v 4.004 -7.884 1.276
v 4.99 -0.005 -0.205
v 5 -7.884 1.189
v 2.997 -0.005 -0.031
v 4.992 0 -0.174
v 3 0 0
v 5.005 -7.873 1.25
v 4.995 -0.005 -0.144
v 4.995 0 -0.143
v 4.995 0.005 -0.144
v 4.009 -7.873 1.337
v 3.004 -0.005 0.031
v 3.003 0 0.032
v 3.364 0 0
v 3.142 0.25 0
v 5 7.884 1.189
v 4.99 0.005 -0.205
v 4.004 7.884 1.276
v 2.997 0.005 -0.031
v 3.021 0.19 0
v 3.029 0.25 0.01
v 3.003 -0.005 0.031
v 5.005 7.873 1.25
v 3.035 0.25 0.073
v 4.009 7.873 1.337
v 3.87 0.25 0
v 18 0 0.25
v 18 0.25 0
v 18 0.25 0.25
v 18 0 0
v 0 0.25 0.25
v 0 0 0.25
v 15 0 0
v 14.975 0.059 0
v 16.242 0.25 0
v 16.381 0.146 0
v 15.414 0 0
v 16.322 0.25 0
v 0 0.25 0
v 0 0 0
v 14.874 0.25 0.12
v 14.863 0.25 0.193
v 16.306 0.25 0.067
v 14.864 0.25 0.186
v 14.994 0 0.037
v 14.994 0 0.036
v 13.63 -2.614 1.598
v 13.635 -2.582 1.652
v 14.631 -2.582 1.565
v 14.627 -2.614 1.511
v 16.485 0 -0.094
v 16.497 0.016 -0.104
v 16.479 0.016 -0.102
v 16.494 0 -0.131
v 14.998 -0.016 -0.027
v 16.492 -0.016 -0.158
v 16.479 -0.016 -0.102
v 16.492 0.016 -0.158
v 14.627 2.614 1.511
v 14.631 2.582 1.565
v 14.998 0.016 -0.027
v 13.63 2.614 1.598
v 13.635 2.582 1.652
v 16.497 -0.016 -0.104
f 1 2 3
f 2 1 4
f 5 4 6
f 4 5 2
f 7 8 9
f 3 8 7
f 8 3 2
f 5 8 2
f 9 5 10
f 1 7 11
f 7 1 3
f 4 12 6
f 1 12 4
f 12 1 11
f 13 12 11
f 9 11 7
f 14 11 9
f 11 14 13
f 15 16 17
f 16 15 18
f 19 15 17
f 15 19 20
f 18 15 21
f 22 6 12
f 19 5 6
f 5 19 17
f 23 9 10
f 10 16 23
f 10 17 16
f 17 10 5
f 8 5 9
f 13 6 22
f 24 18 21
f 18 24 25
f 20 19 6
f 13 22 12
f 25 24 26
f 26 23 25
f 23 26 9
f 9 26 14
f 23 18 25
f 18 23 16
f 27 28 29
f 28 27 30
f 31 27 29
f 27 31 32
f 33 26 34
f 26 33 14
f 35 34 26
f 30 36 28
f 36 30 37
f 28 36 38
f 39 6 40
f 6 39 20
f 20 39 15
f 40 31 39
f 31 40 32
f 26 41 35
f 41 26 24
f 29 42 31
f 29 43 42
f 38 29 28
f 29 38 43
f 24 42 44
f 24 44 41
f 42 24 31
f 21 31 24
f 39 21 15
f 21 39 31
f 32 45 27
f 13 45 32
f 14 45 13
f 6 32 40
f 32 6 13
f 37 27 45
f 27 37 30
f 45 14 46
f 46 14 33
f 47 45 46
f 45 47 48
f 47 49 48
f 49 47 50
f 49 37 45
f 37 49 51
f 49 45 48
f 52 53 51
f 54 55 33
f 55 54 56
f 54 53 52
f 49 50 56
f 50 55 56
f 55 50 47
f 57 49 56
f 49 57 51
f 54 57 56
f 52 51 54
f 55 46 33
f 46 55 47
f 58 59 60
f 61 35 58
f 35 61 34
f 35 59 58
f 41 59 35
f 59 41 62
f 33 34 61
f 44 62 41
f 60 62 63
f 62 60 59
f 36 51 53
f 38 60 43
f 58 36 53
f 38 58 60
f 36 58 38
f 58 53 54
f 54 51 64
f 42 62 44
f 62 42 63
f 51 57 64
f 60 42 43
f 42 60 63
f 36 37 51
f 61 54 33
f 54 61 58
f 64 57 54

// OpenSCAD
$fn = 480;

union() {
	union() {
		cube(size = [18, 0.2500000000, 0.2500000000]);
		translate(v = [3, 0, 0]) {
			rotate(a = [5, 0, 90]) {
				rotate(a = [0, 10, 0]) {
					linear_extrude(center = true, convexity = 0, height = 0.0625000000, twist = 0) {
						polygon(paths = [[0, 1, 2, 3]], points = [[0, 0], [-8, -0.8885280531], [-8, -1.8885280531], [0, -2]]);
					}
				}
				rotate(a = [0, -10, 0]) {
					linear_extrude(center = true, convexity = 0, height = 0.0625000000, twist = 0) {
						polygon(paths = [[0, 1, 2, 3]], points = [[0, 0], [8, -0.8885280531], [8, -1.8885280531], [0, -2]]);
					}
				}
			}
		}
	}
	translate(v = [15, 0, 0]) {
		rotate(a = [5, 0, 90]) {
			rotate(a = [0, 30, 0]) {
				linear_extrude(center = true, convexity = 0, height = 0.0625000000, twist = 0) {
					polygon(paths = [[0, 1, 2, 3]], points = [[0, 0], [-3, 1.5036083501], [-3, 0.5036083501], [0, -1.5000000000]]);
				}
			}
			rotate(a = [0, -30, 0]) {
				linear_extrude(center = true, convexity = 0, height = 0.0625000000, twist = 0) {
					polygon(paths = [[0, 1, 2, 3]], points = [[0, 0], [3, 1.5036083501], [3, 0.5036083501], [0, -1.5000000000]]);
				}
			}
		}
	}
}
/***********************************************
*********      SolidPython code:      **********
************************************************
 
#! /usr/bin/env python
# -*- coding: UTF-8 -*-
from __future__ import division
import os
import sys
import re
from solid import *
import solid.utils
import math

SEGMENTS = 480

def glider(canardWingSpan,canardWingTipChord,canardWingRootChord,canardWingSweepAngle,canardWingDihedralAngle,canardWingXPos,canardWingAngleOfAttack,
           mainWingSpan,mainWingTipChord,mainWingRootChord,mainWingSweepAngle,mainWingDihedralAngle,mainWingXPos,mainWingAngleOfAttack,
           fuselageLength,fuselageWidth):

    def generateWing(Span,TipChord,RootChord,SweepAngle,DihedralAngle,flip):
        #forwardLeft = [0,0,0] #starts from the origin #forwardRight = [0+Span,0-Span/tan(SweepAngle),0]
        #backwardLeft = [0,0-RootChord,0] #backwardRight = [0+Span,0-Span/tan(SweepAngle)-TipChord,0]
        #linear_extrude(height = 1/16, center = true, convexity = 10, twist = 0)
        if flip == True:
            points=[[0,0],[0+Span,0-Span/math.tan(90-SweepAngle)],[0+Span,0-Span/math.tan(90-SweepAngle)-TipChord],[0,0-RootChord]]
        else:
            points=[[0,0],[0-Span,0-Span/math.tan(90-SweepAngle)],[0-Span,0-Span/math.tan(90-SweepAngle)-TipChord],[0,0-RootChord]]

        return polygon(points)

    #drawing the fuselage
    final = cube([fuselageLength,fuselageWidth,fuselageWidth])

    mainWings = translate([mainWingXPos,0,0])(
                     rotate([mainWingAngleOfAttack,0,90])
                        (
                        rotate([0,mainWingDihedralAngle,0])
                            (linear_extrude(1/16,True,0,0)
                                (generateWing(mainWingSpan,mainWingTipChord,mainWingRootChord,mainWingSweepAngle,mainWingDihedralAngle,False))),
                        rotate([0,-mainWingDihedralAngle,0])
                            (linear_extrude(1/16,True,0,0)
                                (generateWing(mainWingSpan,mainWingTipChord,mainWingRootChord,mainWingSweepAngle,mainWingDihedralAngle,True)))
                        ))

    canardWings = translate([canardWingXPos,0,0])(
                         rotate([canardWingAngleOfAttack,0,90])
                            (
                            rotate([0,canardWingDihedralAngle,0])(linear_extrude(1/16,True,0,0)(generateWing(canardWingSpan,canardWingTipChord,canardWingRootChord,canardWingSweepAngle,canardWingDihedralAngle,False))),
                            rotate([0,-canardWingDihedralAngle,0])(linear_extrude(1/16,True,0,0)(generateWing(canardWingSpan,canardWingTipChord,canardWingRootChord,canardWingSweepAngle,canardWingDihedralAngle,True)))
                            ))

    #final = final + mainWings
    final = final + mainWings + canardWings
    return final

if __name__ == '__main__':
    out_dir = sys.argv[1] if len(sys.argv) > 1 else os.curdir
    file_out = os.path.join(out_dir, 'basic_geometry.scad')

    # for canard of aircraft
    canardWingSpan = 3
    canardWingTipChord = 1
    canardWingRootChord = 1.5
    canardWingSweepAngle = 0
    canardWingDihedralAngle = 30
    canardWingXPos = 15
    canardWingAngleOfAttack = 5

    #for Main wing of aircraft
    mainWingSpan = 8
    mainWingTipChord = 1
    mainWingRootChord = 2
    mainWingSweepAngle = 10
    mainWingDihedralAngle = 10
    mainWingXPos = 3 #Yes, yes, I know it's negative, big fucking brohaha.
    mainWingAngleOfAttack = 5

    # for fuselage of Aircraft
    fuselageLength = 18
    fuselageWidth = 0.25



    a = glider(canardWingSpan,canardWingTipChord,canardWingRootChord,
               canardWingSweepAngle,canardWingDihedralAngle,
               canardWingXPos,canardWingAngleOfAttack,
               mainWingSpan,mainWingTipChord,mainWingRootChord,
               mainWingSweepAngle,mainWingDihedralAngle,
               mainWingXPos,mainWingAngleOfAttack,
               fuselageLength,fuselageWidth)


    print("%(__file__)s: SCAD file written to: \n%(file_out)s" % vars())

    # Adding the file_header argument as shown allows you to change
    # the detail of arcs by changing the SEGMENTS variable.  This can
    # be expensive when making lots of small curves, but is otherwise
    # useful.
    scad_render_to_file(a, file_out, file_header='$fn = %s;' % SEGMENTS)
 
 
************************************************/
